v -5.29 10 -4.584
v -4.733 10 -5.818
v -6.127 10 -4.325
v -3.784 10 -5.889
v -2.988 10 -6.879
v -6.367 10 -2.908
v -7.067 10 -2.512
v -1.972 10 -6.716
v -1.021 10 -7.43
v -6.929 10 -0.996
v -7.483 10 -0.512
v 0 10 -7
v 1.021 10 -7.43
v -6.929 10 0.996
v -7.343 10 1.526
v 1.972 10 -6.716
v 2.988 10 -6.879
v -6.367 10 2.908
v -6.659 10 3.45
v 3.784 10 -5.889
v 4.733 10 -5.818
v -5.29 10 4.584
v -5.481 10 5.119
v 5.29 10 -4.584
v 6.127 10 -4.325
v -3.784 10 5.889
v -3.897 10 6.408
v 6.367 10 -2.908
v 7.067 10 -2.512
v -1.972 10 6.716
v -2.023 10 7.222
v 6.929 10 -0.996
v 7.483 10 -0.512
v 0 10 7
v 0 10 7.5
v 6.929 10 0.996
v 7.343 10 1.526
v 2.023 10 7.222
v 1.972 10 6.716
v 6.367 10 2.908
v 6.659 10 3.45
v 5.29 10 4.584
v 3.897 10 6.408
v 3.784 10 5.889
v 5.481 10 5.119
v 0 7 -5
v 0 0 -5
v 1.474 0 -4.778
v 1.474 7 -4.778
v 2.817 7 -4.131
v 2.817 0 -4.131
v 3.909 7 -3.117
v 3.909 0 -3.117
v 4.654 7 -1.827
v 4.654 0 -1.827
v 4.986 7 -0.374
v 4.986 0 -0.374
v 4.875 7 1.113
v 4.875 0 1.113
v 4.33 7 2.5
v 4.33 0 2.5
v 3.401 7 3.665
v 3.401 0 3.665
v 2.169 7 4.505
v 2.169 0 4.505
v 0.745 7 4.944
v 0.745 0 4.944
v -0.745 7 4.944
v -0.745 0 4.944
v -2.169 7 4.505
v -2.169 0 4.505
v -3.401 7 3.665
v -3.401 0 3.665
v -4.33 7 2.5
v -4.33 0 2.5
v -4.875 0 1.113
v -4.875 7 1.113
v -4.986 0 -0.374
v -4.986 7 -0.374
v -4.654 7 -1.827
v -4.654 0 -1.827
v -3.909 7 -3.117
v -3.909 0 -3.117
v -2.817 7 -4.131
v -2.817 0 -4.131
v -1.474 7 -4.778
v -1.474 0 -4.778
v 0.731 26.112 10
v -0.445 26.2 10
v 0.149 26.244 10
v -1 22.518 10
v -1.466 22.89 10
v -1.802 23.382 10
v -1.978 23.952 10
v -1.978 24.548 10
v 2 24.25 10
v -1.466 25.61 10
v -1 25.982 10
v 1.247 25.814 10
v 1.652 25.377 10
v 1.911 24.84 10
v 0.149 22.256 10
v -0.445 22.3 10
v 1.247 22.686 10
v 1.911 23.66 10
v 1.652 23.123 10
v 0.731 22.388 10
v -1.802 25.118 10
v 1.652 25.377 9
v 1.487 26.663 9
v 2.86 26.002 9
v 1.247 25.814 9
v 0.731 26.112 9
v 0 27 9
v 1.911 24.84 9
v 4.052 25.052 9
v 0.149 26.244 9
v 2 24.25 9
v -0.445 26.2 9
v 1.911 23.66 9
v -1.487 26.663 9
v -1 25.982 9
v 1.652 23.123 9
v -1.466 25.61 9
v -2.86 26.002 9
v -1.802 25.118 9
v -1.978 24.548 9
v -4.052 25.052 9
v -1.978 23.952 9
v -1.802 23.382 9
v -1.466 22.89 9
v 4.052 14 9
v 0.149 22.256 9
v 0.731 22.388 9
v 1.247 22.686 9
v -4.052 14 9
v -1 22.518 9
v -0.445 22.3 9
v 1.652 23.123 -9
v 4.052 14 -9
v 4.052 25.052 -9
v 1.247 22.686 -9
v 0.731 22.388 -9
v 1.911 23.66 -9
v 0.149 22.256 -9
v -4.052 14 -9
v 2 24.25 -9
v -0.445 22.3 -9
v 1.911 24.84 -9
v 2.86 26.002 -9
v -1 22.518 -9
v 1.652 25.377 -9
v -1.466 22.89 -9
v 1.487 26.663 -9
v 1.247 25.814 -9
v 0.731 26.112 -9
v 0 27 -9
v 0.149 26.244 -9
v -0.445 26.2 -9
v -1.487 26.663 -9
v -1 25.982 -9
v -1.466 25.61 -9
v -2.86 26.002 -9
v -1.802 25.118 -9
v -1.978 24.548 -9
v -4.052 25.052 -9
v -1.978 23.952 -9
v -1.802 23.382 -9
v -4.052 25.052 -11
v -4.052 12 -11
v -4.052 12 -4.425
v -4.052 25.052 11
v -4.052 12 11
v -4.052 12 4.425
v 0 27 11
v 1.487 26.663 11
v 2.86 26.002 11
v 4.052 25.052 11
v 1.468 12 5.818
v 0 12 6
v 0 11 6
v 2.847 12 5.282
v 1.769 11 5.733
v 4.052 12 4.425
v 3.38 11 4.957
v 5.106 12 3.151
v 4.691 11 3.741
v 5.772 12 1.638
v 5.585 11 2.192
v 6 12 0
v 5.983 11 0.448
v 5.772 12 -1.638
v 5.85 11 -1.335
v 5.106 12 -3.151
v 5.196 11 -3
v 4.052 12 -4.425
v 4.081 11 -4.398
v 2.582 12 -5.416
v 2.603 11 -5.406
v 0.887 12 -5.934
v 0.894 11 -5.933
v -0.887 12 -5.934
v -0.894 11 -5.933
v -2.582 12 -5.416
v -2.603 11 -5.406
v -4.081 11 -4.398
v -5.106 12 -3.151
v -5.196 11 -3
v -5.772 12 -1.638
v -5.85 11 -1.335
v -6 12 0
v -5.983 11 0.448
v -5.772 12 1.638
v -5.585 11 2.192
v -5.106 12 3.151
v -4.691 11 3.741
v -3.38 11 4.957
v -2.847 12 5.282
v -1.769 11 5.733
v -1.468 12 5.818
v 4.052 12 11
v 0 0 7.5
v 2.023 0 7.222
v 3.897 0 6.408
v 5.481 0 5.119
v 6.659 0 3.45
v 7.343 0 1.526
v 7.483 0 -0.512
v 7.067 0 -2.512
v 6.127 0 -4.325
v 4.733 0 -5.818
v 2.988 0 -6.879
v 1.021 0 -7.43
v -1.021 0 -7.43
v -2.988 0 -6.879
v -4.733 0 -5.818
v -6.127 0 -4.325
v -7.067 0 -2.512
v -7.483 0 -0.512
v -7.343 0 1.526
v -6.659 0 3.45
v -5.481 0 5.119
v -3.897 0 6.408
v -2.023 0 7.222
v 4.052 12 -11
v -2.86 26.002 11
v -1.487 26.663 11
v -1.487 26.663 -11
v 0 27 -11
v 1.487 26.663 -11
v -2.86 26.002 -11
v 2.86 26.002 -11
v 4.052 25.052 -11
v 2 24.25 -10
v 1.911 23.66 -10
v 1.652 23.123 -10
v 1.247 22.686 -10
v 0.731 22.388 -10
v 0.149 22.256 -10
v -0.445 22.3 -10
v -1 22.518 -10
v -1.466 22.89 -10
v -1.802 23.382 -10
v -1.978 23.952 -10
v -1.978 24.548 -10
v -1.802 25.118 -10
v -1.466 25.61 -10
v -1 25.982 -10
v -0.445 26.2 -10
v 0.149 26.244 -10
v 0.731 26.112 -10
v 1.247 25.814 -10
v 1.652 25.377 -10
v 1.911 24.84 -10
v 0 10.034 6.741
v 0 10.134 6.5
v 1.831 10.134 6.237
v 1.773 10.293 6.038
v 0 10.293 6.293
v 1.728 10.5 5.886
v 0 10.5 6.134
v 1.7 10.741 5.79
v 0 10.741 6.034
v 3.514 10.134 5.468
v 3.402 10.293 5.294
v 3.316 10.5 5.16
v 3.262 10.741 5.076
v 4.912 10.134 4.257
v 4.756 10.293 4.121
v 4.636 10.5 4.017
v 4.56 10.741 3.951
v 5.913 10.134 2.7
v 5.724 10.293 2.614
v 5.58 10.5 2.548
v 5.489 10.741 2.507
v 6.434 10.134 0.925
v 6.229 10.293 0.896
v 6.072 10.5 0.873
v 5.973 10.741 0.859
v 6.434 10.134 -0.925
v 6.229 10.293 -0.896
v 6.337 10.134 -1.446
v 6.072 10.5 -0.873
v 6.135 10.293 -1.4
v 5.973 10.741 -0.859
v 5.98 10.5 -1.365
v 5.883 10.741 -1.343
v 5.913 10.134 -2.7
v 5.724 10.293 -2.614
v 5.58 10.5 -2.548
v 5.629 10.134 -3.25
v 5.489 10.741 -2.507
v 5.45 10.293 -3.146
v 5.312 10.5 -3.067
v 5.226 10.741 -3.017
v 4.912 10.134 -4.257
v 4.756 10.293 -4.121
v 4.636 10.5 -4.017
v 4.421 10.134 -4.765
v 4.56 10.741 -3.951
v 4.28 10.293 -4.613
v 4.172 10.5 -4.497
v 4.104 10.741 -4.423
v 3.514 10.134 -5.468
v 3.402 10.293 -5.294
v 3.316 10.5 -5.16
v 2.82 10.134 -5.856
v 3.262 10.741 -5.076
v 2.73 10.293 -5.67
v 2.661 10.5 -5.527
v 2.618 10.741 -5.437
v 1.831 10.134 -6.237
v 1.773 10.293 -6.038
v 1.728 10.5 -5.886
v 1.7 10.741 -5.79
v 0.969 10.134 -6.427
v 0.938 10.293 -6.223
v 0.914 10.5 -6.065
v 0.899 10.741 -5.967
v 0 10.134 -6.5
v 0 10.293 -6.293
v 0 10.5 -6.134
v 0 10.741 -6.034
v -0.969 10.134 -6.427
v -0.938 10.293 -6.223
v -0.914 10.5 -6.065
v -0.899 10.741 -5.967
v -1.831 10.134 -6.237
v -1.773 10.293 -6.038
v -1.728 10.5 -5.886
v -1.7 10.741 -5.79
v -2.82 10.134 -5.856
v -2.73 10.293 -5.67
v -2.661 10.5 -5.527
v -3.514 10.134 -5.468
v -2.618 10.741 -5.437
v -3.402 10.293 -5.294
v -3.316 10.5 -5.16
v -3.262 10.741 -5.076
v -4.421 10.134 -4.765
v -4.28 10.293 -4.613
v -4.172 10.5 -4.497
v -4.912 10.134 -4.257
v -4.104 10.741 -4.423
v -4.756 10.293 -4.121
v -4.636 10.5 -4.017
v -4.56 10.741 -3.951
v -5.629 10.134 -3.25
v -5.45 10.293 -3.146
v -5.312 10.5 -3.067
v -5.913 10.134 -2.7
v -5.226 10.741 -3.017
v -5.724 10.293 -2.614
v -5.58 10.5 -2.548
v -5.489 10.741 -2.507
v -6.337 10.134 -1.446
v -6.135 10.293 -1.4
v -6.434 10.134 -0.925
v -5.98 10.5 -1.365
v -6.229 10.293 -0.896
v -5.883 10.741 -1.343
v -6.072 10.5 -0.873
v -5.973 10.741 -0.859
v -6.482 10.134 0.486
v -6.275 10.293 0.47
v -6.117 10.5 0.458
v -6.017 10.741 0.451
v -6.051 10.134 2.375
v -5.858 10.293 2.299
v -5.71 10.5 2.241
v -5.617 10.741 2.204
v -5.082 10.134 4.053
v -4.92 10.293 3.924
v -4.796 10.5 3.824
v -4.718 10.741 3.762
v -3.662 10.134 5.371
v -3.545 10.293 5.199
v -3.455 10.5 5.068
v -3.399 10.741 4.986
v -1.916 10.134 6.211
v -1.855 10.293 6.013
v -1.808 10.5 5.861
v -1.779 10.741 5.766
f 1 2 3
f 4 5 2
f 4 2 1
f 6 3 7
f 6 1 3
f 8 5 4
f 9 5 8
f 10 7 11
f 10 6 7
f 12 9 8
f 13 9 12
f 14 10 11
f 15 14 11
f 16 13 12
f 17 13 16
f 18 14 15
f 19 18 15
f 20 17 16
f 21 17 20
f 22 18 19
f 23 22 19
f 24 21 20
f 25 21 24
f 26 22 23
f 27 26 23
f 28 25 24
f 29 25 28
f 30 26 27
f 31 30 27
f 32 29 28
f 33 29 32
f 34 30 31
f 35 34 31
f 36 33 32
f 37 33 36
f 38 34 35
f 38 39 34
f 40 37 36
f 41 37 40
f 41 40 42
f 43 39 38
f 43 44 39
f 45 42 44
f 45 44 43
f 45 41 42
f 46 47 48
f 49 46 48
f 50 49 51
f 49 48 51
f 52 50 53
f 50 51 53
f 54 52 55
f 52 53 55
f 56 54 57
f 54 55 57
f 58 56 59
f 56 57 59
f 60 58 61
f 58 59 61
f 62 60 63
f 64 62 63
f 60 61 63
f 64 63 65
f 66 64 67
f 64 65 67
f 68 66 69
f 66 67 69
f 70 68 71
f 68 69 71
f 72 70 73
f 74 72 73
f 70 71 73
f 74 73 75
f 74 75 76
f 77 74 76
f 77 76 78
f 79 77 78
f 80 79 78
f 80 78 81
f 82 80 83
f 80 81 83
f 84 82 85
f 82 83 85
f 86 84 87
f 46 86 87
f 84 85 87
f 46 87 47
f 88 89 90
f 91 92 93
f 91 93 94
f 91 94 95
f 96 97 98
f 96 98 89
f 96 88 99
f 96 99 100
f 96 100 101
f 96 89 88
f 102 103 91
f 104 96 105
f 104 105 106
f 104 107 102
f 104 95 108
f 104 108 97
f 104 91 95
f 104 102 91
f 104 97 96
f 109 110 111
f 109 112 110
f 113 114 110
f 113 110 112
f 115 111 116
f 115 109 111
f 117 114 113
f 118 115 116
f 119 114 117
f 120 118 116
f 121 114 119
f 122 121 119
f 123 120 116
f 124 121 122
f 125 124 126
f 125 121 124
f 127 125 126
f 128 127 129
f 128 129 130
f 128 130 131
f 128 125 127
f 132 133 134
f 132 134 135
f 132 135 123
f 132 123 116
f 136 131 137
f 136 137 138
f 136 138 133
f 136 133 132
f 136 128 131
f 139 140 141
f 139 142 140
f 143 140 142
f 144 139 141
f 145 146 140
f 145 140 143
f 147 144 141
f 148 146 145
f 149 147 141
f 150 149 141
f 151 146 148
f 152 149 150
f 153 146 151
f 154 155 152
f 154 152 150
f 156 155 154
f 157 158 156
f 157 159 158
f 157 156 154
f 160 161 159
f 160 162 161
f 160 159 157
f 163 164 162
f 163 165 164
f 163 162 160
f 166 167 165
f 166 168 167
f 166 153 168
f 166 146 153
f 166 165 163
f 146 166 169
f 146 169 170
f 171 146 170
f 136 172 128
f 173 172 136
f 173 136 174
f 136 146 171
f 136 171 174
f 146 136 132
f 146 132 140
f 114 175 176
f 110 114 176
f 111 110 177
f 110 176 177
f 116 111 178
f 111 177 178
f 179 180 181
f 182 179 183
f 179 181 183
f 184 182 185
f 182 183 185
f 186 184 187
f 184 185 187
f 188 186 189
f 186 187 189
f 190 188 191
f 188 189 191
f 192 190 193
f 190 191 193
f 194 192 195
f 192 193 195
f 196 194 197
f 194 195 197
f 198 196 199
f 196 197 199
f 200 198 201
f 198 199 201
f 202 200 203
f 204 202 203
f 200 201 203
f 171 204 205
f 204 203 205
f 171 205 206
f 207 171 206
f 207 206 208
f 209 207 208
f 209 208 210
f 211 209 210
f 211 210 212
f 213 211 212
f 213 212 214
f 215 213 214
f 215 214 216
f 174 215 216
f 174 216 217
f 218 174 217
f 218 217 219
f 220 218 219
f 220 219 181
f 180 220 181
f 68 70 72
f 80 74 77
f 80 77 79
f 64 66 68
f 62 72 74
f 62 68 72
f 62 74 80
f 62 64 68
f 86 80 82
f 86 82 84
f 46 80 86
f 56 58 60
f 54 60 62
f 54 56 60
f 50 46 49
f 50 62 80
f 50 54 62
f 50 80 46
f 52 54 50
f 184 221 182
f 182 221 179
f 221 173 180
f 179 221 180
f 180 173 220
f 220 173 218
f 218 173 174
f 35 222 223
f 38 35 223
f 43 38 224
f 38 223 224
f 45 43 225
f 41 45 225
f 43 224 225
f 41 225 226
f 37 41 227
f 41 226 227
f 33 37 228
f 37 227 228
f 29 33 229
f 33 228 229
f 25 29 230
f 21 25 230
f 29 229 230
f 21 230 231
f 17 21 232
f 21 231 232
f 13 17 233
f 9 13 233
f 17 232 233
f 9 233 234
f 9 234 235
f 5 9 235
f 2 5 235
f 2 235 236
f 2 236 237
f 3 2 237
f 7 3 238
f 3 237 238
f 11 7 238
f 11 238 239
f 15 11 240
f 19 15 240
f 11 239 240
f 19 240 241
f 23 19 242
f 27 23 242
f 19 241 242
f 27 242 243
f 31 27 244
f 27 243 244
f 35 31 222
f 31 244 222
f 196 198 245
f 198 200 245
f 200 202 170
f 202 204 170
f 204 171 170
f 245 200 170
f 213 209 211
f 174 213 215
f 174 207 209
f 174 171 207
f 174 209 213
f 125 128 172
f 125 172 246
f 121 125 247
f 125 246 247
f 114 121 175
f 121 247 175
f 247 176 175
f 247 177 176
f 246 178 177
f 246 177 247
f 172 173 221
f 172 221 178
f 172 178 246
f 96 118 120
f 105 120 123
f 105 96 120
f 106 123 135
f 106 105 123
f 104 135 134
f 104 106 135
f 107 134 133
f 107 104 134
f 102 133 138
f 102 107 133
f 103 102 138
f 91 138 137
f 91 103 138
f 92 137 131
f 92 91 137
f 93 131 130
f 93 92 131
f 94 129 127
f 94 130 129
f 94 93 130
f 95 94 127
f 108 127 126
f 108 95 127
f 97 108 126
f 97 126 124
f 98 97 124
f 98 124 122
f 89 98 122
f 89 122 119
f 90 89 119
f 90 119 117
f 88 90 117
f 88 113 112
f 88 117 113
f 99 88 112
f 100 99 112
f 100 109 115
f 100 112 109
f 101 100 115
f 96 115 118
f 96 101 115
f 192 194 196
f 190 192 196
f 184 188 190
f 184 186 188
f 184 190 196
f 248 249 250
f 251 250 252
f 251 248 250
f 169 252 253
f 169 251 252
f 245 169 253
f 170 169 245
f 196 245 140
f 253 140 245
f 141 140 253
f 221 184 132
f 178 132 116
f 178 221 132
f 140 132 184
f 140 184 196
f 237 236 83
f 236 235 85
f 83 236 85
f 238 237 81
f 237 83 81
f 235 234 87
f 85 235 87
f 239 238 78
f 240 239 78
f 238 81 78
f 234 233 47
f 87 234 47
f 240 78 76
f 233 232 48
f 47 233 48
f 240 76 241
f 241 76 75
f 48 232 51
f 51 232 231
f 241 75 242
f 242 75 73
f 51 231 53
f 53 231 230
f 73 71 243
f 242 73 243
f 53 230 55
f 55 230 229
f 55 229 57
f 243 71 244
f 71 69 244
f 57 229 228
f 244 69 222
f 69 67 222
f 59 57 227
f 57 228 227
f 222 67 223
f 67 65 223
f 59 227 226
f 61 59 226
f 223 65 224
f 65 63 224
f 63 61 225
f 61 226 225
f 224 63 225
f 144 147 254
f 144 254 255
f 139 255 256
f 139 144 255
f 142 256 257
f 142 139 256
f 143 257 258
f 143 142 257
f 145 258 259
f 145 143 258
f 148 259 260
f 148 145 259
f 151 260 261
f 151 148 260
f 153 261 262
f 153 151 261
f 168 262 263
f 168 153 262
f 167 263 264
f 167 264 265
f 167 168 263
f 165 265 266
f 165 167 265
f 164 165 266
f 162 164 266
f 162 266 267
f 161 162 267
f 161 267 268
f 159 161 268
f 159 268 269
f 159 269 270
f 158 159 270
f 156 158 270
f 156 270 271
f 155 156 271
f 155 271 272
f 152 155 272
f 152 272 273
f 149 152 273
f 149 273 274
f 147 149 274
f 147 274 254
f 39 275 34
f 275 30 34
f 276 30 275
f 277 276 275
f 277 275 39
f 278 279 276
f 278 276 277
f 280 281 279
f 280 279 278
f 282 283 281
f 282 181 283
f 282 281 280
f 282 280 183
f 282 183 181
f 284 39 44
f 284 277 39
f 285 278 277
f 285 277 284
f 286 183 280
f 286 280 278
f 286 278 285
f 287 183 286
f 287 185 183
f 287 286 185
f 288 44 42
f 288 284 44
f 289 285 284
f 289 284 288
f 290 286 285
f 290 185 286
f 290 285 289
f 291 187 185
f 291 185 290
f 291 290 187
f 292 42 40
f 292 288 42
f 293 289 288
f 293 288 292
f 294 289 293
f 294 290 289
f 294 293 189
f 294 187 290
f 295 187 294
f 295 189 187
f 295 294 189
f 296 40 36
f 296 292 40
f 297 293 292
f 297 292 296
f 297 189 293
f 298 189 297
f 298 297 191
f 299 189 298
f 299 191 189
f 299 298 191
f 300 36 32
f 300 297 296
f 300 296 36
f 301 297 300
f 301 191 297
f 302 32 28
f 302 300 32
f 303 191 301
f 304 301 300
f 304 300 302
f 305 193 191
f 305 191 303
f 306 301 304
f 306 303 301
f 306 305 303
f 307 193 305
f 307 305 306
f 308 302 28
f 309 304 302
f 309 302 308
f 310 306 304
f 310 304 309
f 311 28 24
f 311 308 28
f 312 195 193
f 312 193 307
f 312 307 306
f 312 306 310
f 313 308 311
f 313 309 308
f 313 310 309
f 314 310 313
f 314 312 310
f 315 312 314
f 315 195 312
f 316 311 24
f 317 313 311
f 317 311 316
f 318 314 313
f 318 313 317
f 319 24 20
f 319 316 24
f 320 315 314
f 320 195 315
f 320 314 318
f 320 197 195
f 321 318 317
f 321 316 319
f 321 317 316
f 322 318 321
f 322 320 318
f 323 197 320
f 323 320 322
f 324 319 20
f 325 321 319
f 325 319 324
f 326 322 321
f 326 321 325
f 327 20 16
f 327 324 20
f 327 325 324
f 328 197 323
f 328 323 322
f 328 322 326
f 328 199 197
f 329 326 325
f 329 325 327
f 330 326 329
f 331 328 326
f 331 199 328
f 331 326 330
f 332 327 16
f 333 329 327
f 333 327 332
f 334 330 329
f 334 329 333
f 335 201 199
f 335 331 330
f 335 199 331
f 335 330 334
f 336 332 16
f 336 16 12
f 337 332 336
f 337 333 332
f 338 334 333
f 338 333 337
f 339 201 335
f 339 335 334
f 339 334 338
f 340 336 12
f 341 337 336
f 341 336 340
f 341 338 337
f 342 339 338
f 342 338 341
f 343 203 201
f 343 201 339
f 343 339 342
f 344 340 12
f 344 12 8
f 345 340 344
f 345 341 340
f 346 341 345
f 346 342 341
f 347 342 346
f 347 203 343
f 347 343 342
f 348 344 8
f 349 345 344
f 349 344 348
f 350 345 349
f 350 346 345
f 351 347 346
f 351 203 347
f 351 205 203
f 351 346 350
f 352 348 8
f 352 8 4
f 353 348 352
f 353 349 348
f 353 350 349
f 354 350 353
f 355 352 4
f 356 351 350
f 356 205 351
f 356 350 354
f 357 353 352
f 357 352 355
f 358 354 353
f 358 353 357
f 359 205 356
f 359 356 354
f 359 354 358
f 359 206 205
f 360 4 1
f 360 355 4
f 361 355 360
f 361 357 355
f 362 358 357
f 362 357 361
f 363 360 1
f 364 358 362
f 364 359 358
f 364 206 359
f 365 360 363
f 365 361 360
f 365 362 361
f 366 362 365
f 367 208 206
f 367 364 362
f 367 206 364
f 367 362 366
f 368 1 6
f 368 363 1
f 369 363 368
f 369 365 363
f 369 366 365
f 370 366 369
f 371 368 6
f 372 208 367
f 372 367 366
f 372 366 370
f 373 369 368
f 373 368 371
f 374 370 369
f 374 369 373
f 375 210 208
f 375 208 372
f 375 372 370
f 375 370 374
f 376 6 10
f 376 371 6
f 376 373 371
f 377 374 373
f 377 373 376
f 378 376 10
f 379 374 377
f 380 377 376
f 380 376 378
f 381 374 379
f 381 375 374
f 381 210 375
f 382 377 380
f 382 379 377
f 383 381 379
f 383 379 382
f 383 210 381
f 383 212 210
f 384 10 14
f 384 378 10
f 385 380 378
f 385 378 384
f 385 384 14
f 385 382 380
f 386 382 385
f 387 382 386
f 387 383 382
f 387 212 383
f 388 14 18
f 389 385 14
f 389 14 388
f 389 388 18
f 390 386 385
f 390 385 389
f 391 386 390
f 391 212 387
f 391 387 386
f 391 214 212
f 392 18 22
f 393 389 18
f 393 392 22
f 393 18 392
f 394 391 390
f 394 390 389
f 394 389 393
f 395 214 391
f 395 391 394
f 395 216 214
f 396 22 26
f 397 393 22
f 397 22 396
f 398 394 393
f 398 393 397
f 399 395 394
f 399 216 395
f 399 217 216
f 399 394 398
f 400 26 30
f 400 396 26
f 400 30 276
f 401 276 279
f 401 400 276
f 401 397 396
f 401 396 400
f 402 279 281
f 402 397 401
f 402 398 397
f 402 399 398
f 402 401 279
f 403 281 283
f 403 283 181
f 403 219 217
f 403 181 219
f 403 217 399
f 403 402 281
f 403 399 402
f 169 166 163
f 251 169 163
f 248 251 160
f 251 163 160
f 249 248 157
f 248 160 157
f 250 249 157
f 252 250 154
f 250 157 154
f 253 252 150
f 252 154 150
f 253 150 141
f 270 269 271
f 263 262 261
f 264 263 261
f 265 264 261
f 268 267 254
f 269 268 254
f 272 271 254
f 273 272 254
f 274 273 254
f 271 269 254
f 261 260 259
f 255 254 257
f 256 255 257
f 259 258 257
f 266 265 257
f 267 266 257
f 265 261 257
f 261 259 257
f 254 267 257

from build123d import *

# Parameters (mm, degrees)
SKETCH1_R                = 7.5
BOSS_EXTRUDE1_DEPTH      = 10
SKETCH5_R                = 6
BOSS_EXTRUDE2_DEPTH      = 2
FILLET2_R                = 1
BOSS_EXTRUDE3_DEPTH      = 6
BOSS_EXTRUDE3_DEPTH_BACK = 6
CUT_EXTRUDE4_DEPTH       = 29
CUT_EXTRUDE5_DEPTH       = 19
CUT_EXTRUDE5_DEPTH_BACK  = 1
SKETCH10_R               = 2
SKETCH12_R               = 5
CUT_EXTRUDE6_DEPTH       = 7
CUT_EXTRUDE7_START       = -36
CUT_EXTRUDE7_DEPTH       = 36


with BuildPart() as part:
    # Sketch1 → Boss-Extrude1 (new body)
    with BuildSketch(Plane(origin=(0, 0, 0), x_dir=(1, 0, 0), z_dir=(0, 1, 0))):
        Circle(SKETCH1_R)
    extrude(amount=BOSS_EXTRUDE1_DEPTH)

    # Sketch5 → Boss-Extrude2 (add)
    with BuildSketch(Plane(origin=(0, 10, 0), x_dir=(1, 0, 0), z_dir=(0, 1, 0))):
        Circle(SKETCH5_R)
    extrude(amount=BOSS_EXTRUDE2_DEPTH)

    # Fillet2
    fillet2_edges = [part.edges().sort_by_distance(p)[0] for p in [
        (-6, 10, 0),
    ]]
    fillet(fillet2_edges, radius=FILLET2_R)

    # Sketch6 → Boss-Extrude3 (add, two sides: drawn at the far end of the back side and taken through both)
    with BuildSketch(Plane(origin=(0, 0, 0), x_dir=(0, 0, -1), z_dir=(1, 0, 0)).offset(-BOSS_EXTRUDE3_DEPTH_BACK)):
        Polygon((6, 12), (-6, 12), (-11, 12), (-11, 27), (-9, 27), (-9, 14), (9, 14), (9, 27), (11, 27), (11, 12), align=None)
    extrude(amount=BOSS_EXTRUDE3_DEPTH + BOSS_EXTRUDE3_DEPTH_BACK)

    # Sketch9 → Cut-Extrude4 (cut)
    with BuildSketch(Plane.XY.offset(11)):
        with BuildLine():
            Line((-6, 27), (-6, 21))
            ThreePointArc((-6, 21), (-4.052343178, 25.052343178), (0, 27))
            Line((0, 27), (-6, 27))
        make_face()
        with BuildLine():
            ThreePointArc((0, 27), (4.052343178, 25.052343178), (6, 21))
            Line((6, 21), (6, 27))
            Line((6, 27), (0, 27))
        make_face()
    extrude(amount=-CUT_EXTRUDE4_DEPTH, mode=Mode.SUBTRACT)

    # Sketch10 → Cut-Extrude5 (cut, two sides: drawn at the far end of the back side and taken through both)
    with BuildSketch(Plane(origin=(0, 0, 9), x_dir=(-1, 0, 0), z_dir=(0, 0, -1)).offset(-CUT_EXTRUDE5_DEPTH_BACK)):
        with Locations((0, 24.25)):
            Circle(SKETCH10_R)
    extrude(amount=CUT_EXTRUDE5_DEPTH + CUT_EXTRUDE5_DEPTH_BACK, mode=Mode.SUBTRACT)

    # Sketch12 → Cut-Extrude6 (cut)
    with BuildSketch(Plane.XZ):
        Circle(SKETCH12_R)
    extrude(amount=-CUT_EXTRUDE6_DEPTH, mode=Mode.SUBTRACT)

    # Sketch13 → Cut-Extrude7 (cut)
    with BuildSketch(Plane(origin=(0, 0, -11), x_dir=(-1, 0, 0), z_dir=(0, 0, -1)).offset(CUT_EXTRUDE7_START)):
        with BuildLine():
            Line((-4.052343178, 12), (-4.052343178, 25.052343178))
            ThreePointArc((-4.052343178, 25.052343178), (-5.371235948, 23.192018094), (-6, 21))
            Line((-6, 21), (-6, 12))
            Line((-6, 12), (-4.052343178, 12))
        make_face()
        with BuildLine():
            Line((4.052343178, 25.052343178), (4.052343178, 12))
            Line((4.052343178, 12), (6, 12))
            Line((6, 12), (6, 21))
            ThreePointArc((6, 21), (5.371235948, 23.192018094), (4.052343178, 25.052343178))
        make_face()
    extrude(amount=CUT_EXTRUDE7_DEPTH, mode=Mode.SUBTRACT)


solid = part.part
